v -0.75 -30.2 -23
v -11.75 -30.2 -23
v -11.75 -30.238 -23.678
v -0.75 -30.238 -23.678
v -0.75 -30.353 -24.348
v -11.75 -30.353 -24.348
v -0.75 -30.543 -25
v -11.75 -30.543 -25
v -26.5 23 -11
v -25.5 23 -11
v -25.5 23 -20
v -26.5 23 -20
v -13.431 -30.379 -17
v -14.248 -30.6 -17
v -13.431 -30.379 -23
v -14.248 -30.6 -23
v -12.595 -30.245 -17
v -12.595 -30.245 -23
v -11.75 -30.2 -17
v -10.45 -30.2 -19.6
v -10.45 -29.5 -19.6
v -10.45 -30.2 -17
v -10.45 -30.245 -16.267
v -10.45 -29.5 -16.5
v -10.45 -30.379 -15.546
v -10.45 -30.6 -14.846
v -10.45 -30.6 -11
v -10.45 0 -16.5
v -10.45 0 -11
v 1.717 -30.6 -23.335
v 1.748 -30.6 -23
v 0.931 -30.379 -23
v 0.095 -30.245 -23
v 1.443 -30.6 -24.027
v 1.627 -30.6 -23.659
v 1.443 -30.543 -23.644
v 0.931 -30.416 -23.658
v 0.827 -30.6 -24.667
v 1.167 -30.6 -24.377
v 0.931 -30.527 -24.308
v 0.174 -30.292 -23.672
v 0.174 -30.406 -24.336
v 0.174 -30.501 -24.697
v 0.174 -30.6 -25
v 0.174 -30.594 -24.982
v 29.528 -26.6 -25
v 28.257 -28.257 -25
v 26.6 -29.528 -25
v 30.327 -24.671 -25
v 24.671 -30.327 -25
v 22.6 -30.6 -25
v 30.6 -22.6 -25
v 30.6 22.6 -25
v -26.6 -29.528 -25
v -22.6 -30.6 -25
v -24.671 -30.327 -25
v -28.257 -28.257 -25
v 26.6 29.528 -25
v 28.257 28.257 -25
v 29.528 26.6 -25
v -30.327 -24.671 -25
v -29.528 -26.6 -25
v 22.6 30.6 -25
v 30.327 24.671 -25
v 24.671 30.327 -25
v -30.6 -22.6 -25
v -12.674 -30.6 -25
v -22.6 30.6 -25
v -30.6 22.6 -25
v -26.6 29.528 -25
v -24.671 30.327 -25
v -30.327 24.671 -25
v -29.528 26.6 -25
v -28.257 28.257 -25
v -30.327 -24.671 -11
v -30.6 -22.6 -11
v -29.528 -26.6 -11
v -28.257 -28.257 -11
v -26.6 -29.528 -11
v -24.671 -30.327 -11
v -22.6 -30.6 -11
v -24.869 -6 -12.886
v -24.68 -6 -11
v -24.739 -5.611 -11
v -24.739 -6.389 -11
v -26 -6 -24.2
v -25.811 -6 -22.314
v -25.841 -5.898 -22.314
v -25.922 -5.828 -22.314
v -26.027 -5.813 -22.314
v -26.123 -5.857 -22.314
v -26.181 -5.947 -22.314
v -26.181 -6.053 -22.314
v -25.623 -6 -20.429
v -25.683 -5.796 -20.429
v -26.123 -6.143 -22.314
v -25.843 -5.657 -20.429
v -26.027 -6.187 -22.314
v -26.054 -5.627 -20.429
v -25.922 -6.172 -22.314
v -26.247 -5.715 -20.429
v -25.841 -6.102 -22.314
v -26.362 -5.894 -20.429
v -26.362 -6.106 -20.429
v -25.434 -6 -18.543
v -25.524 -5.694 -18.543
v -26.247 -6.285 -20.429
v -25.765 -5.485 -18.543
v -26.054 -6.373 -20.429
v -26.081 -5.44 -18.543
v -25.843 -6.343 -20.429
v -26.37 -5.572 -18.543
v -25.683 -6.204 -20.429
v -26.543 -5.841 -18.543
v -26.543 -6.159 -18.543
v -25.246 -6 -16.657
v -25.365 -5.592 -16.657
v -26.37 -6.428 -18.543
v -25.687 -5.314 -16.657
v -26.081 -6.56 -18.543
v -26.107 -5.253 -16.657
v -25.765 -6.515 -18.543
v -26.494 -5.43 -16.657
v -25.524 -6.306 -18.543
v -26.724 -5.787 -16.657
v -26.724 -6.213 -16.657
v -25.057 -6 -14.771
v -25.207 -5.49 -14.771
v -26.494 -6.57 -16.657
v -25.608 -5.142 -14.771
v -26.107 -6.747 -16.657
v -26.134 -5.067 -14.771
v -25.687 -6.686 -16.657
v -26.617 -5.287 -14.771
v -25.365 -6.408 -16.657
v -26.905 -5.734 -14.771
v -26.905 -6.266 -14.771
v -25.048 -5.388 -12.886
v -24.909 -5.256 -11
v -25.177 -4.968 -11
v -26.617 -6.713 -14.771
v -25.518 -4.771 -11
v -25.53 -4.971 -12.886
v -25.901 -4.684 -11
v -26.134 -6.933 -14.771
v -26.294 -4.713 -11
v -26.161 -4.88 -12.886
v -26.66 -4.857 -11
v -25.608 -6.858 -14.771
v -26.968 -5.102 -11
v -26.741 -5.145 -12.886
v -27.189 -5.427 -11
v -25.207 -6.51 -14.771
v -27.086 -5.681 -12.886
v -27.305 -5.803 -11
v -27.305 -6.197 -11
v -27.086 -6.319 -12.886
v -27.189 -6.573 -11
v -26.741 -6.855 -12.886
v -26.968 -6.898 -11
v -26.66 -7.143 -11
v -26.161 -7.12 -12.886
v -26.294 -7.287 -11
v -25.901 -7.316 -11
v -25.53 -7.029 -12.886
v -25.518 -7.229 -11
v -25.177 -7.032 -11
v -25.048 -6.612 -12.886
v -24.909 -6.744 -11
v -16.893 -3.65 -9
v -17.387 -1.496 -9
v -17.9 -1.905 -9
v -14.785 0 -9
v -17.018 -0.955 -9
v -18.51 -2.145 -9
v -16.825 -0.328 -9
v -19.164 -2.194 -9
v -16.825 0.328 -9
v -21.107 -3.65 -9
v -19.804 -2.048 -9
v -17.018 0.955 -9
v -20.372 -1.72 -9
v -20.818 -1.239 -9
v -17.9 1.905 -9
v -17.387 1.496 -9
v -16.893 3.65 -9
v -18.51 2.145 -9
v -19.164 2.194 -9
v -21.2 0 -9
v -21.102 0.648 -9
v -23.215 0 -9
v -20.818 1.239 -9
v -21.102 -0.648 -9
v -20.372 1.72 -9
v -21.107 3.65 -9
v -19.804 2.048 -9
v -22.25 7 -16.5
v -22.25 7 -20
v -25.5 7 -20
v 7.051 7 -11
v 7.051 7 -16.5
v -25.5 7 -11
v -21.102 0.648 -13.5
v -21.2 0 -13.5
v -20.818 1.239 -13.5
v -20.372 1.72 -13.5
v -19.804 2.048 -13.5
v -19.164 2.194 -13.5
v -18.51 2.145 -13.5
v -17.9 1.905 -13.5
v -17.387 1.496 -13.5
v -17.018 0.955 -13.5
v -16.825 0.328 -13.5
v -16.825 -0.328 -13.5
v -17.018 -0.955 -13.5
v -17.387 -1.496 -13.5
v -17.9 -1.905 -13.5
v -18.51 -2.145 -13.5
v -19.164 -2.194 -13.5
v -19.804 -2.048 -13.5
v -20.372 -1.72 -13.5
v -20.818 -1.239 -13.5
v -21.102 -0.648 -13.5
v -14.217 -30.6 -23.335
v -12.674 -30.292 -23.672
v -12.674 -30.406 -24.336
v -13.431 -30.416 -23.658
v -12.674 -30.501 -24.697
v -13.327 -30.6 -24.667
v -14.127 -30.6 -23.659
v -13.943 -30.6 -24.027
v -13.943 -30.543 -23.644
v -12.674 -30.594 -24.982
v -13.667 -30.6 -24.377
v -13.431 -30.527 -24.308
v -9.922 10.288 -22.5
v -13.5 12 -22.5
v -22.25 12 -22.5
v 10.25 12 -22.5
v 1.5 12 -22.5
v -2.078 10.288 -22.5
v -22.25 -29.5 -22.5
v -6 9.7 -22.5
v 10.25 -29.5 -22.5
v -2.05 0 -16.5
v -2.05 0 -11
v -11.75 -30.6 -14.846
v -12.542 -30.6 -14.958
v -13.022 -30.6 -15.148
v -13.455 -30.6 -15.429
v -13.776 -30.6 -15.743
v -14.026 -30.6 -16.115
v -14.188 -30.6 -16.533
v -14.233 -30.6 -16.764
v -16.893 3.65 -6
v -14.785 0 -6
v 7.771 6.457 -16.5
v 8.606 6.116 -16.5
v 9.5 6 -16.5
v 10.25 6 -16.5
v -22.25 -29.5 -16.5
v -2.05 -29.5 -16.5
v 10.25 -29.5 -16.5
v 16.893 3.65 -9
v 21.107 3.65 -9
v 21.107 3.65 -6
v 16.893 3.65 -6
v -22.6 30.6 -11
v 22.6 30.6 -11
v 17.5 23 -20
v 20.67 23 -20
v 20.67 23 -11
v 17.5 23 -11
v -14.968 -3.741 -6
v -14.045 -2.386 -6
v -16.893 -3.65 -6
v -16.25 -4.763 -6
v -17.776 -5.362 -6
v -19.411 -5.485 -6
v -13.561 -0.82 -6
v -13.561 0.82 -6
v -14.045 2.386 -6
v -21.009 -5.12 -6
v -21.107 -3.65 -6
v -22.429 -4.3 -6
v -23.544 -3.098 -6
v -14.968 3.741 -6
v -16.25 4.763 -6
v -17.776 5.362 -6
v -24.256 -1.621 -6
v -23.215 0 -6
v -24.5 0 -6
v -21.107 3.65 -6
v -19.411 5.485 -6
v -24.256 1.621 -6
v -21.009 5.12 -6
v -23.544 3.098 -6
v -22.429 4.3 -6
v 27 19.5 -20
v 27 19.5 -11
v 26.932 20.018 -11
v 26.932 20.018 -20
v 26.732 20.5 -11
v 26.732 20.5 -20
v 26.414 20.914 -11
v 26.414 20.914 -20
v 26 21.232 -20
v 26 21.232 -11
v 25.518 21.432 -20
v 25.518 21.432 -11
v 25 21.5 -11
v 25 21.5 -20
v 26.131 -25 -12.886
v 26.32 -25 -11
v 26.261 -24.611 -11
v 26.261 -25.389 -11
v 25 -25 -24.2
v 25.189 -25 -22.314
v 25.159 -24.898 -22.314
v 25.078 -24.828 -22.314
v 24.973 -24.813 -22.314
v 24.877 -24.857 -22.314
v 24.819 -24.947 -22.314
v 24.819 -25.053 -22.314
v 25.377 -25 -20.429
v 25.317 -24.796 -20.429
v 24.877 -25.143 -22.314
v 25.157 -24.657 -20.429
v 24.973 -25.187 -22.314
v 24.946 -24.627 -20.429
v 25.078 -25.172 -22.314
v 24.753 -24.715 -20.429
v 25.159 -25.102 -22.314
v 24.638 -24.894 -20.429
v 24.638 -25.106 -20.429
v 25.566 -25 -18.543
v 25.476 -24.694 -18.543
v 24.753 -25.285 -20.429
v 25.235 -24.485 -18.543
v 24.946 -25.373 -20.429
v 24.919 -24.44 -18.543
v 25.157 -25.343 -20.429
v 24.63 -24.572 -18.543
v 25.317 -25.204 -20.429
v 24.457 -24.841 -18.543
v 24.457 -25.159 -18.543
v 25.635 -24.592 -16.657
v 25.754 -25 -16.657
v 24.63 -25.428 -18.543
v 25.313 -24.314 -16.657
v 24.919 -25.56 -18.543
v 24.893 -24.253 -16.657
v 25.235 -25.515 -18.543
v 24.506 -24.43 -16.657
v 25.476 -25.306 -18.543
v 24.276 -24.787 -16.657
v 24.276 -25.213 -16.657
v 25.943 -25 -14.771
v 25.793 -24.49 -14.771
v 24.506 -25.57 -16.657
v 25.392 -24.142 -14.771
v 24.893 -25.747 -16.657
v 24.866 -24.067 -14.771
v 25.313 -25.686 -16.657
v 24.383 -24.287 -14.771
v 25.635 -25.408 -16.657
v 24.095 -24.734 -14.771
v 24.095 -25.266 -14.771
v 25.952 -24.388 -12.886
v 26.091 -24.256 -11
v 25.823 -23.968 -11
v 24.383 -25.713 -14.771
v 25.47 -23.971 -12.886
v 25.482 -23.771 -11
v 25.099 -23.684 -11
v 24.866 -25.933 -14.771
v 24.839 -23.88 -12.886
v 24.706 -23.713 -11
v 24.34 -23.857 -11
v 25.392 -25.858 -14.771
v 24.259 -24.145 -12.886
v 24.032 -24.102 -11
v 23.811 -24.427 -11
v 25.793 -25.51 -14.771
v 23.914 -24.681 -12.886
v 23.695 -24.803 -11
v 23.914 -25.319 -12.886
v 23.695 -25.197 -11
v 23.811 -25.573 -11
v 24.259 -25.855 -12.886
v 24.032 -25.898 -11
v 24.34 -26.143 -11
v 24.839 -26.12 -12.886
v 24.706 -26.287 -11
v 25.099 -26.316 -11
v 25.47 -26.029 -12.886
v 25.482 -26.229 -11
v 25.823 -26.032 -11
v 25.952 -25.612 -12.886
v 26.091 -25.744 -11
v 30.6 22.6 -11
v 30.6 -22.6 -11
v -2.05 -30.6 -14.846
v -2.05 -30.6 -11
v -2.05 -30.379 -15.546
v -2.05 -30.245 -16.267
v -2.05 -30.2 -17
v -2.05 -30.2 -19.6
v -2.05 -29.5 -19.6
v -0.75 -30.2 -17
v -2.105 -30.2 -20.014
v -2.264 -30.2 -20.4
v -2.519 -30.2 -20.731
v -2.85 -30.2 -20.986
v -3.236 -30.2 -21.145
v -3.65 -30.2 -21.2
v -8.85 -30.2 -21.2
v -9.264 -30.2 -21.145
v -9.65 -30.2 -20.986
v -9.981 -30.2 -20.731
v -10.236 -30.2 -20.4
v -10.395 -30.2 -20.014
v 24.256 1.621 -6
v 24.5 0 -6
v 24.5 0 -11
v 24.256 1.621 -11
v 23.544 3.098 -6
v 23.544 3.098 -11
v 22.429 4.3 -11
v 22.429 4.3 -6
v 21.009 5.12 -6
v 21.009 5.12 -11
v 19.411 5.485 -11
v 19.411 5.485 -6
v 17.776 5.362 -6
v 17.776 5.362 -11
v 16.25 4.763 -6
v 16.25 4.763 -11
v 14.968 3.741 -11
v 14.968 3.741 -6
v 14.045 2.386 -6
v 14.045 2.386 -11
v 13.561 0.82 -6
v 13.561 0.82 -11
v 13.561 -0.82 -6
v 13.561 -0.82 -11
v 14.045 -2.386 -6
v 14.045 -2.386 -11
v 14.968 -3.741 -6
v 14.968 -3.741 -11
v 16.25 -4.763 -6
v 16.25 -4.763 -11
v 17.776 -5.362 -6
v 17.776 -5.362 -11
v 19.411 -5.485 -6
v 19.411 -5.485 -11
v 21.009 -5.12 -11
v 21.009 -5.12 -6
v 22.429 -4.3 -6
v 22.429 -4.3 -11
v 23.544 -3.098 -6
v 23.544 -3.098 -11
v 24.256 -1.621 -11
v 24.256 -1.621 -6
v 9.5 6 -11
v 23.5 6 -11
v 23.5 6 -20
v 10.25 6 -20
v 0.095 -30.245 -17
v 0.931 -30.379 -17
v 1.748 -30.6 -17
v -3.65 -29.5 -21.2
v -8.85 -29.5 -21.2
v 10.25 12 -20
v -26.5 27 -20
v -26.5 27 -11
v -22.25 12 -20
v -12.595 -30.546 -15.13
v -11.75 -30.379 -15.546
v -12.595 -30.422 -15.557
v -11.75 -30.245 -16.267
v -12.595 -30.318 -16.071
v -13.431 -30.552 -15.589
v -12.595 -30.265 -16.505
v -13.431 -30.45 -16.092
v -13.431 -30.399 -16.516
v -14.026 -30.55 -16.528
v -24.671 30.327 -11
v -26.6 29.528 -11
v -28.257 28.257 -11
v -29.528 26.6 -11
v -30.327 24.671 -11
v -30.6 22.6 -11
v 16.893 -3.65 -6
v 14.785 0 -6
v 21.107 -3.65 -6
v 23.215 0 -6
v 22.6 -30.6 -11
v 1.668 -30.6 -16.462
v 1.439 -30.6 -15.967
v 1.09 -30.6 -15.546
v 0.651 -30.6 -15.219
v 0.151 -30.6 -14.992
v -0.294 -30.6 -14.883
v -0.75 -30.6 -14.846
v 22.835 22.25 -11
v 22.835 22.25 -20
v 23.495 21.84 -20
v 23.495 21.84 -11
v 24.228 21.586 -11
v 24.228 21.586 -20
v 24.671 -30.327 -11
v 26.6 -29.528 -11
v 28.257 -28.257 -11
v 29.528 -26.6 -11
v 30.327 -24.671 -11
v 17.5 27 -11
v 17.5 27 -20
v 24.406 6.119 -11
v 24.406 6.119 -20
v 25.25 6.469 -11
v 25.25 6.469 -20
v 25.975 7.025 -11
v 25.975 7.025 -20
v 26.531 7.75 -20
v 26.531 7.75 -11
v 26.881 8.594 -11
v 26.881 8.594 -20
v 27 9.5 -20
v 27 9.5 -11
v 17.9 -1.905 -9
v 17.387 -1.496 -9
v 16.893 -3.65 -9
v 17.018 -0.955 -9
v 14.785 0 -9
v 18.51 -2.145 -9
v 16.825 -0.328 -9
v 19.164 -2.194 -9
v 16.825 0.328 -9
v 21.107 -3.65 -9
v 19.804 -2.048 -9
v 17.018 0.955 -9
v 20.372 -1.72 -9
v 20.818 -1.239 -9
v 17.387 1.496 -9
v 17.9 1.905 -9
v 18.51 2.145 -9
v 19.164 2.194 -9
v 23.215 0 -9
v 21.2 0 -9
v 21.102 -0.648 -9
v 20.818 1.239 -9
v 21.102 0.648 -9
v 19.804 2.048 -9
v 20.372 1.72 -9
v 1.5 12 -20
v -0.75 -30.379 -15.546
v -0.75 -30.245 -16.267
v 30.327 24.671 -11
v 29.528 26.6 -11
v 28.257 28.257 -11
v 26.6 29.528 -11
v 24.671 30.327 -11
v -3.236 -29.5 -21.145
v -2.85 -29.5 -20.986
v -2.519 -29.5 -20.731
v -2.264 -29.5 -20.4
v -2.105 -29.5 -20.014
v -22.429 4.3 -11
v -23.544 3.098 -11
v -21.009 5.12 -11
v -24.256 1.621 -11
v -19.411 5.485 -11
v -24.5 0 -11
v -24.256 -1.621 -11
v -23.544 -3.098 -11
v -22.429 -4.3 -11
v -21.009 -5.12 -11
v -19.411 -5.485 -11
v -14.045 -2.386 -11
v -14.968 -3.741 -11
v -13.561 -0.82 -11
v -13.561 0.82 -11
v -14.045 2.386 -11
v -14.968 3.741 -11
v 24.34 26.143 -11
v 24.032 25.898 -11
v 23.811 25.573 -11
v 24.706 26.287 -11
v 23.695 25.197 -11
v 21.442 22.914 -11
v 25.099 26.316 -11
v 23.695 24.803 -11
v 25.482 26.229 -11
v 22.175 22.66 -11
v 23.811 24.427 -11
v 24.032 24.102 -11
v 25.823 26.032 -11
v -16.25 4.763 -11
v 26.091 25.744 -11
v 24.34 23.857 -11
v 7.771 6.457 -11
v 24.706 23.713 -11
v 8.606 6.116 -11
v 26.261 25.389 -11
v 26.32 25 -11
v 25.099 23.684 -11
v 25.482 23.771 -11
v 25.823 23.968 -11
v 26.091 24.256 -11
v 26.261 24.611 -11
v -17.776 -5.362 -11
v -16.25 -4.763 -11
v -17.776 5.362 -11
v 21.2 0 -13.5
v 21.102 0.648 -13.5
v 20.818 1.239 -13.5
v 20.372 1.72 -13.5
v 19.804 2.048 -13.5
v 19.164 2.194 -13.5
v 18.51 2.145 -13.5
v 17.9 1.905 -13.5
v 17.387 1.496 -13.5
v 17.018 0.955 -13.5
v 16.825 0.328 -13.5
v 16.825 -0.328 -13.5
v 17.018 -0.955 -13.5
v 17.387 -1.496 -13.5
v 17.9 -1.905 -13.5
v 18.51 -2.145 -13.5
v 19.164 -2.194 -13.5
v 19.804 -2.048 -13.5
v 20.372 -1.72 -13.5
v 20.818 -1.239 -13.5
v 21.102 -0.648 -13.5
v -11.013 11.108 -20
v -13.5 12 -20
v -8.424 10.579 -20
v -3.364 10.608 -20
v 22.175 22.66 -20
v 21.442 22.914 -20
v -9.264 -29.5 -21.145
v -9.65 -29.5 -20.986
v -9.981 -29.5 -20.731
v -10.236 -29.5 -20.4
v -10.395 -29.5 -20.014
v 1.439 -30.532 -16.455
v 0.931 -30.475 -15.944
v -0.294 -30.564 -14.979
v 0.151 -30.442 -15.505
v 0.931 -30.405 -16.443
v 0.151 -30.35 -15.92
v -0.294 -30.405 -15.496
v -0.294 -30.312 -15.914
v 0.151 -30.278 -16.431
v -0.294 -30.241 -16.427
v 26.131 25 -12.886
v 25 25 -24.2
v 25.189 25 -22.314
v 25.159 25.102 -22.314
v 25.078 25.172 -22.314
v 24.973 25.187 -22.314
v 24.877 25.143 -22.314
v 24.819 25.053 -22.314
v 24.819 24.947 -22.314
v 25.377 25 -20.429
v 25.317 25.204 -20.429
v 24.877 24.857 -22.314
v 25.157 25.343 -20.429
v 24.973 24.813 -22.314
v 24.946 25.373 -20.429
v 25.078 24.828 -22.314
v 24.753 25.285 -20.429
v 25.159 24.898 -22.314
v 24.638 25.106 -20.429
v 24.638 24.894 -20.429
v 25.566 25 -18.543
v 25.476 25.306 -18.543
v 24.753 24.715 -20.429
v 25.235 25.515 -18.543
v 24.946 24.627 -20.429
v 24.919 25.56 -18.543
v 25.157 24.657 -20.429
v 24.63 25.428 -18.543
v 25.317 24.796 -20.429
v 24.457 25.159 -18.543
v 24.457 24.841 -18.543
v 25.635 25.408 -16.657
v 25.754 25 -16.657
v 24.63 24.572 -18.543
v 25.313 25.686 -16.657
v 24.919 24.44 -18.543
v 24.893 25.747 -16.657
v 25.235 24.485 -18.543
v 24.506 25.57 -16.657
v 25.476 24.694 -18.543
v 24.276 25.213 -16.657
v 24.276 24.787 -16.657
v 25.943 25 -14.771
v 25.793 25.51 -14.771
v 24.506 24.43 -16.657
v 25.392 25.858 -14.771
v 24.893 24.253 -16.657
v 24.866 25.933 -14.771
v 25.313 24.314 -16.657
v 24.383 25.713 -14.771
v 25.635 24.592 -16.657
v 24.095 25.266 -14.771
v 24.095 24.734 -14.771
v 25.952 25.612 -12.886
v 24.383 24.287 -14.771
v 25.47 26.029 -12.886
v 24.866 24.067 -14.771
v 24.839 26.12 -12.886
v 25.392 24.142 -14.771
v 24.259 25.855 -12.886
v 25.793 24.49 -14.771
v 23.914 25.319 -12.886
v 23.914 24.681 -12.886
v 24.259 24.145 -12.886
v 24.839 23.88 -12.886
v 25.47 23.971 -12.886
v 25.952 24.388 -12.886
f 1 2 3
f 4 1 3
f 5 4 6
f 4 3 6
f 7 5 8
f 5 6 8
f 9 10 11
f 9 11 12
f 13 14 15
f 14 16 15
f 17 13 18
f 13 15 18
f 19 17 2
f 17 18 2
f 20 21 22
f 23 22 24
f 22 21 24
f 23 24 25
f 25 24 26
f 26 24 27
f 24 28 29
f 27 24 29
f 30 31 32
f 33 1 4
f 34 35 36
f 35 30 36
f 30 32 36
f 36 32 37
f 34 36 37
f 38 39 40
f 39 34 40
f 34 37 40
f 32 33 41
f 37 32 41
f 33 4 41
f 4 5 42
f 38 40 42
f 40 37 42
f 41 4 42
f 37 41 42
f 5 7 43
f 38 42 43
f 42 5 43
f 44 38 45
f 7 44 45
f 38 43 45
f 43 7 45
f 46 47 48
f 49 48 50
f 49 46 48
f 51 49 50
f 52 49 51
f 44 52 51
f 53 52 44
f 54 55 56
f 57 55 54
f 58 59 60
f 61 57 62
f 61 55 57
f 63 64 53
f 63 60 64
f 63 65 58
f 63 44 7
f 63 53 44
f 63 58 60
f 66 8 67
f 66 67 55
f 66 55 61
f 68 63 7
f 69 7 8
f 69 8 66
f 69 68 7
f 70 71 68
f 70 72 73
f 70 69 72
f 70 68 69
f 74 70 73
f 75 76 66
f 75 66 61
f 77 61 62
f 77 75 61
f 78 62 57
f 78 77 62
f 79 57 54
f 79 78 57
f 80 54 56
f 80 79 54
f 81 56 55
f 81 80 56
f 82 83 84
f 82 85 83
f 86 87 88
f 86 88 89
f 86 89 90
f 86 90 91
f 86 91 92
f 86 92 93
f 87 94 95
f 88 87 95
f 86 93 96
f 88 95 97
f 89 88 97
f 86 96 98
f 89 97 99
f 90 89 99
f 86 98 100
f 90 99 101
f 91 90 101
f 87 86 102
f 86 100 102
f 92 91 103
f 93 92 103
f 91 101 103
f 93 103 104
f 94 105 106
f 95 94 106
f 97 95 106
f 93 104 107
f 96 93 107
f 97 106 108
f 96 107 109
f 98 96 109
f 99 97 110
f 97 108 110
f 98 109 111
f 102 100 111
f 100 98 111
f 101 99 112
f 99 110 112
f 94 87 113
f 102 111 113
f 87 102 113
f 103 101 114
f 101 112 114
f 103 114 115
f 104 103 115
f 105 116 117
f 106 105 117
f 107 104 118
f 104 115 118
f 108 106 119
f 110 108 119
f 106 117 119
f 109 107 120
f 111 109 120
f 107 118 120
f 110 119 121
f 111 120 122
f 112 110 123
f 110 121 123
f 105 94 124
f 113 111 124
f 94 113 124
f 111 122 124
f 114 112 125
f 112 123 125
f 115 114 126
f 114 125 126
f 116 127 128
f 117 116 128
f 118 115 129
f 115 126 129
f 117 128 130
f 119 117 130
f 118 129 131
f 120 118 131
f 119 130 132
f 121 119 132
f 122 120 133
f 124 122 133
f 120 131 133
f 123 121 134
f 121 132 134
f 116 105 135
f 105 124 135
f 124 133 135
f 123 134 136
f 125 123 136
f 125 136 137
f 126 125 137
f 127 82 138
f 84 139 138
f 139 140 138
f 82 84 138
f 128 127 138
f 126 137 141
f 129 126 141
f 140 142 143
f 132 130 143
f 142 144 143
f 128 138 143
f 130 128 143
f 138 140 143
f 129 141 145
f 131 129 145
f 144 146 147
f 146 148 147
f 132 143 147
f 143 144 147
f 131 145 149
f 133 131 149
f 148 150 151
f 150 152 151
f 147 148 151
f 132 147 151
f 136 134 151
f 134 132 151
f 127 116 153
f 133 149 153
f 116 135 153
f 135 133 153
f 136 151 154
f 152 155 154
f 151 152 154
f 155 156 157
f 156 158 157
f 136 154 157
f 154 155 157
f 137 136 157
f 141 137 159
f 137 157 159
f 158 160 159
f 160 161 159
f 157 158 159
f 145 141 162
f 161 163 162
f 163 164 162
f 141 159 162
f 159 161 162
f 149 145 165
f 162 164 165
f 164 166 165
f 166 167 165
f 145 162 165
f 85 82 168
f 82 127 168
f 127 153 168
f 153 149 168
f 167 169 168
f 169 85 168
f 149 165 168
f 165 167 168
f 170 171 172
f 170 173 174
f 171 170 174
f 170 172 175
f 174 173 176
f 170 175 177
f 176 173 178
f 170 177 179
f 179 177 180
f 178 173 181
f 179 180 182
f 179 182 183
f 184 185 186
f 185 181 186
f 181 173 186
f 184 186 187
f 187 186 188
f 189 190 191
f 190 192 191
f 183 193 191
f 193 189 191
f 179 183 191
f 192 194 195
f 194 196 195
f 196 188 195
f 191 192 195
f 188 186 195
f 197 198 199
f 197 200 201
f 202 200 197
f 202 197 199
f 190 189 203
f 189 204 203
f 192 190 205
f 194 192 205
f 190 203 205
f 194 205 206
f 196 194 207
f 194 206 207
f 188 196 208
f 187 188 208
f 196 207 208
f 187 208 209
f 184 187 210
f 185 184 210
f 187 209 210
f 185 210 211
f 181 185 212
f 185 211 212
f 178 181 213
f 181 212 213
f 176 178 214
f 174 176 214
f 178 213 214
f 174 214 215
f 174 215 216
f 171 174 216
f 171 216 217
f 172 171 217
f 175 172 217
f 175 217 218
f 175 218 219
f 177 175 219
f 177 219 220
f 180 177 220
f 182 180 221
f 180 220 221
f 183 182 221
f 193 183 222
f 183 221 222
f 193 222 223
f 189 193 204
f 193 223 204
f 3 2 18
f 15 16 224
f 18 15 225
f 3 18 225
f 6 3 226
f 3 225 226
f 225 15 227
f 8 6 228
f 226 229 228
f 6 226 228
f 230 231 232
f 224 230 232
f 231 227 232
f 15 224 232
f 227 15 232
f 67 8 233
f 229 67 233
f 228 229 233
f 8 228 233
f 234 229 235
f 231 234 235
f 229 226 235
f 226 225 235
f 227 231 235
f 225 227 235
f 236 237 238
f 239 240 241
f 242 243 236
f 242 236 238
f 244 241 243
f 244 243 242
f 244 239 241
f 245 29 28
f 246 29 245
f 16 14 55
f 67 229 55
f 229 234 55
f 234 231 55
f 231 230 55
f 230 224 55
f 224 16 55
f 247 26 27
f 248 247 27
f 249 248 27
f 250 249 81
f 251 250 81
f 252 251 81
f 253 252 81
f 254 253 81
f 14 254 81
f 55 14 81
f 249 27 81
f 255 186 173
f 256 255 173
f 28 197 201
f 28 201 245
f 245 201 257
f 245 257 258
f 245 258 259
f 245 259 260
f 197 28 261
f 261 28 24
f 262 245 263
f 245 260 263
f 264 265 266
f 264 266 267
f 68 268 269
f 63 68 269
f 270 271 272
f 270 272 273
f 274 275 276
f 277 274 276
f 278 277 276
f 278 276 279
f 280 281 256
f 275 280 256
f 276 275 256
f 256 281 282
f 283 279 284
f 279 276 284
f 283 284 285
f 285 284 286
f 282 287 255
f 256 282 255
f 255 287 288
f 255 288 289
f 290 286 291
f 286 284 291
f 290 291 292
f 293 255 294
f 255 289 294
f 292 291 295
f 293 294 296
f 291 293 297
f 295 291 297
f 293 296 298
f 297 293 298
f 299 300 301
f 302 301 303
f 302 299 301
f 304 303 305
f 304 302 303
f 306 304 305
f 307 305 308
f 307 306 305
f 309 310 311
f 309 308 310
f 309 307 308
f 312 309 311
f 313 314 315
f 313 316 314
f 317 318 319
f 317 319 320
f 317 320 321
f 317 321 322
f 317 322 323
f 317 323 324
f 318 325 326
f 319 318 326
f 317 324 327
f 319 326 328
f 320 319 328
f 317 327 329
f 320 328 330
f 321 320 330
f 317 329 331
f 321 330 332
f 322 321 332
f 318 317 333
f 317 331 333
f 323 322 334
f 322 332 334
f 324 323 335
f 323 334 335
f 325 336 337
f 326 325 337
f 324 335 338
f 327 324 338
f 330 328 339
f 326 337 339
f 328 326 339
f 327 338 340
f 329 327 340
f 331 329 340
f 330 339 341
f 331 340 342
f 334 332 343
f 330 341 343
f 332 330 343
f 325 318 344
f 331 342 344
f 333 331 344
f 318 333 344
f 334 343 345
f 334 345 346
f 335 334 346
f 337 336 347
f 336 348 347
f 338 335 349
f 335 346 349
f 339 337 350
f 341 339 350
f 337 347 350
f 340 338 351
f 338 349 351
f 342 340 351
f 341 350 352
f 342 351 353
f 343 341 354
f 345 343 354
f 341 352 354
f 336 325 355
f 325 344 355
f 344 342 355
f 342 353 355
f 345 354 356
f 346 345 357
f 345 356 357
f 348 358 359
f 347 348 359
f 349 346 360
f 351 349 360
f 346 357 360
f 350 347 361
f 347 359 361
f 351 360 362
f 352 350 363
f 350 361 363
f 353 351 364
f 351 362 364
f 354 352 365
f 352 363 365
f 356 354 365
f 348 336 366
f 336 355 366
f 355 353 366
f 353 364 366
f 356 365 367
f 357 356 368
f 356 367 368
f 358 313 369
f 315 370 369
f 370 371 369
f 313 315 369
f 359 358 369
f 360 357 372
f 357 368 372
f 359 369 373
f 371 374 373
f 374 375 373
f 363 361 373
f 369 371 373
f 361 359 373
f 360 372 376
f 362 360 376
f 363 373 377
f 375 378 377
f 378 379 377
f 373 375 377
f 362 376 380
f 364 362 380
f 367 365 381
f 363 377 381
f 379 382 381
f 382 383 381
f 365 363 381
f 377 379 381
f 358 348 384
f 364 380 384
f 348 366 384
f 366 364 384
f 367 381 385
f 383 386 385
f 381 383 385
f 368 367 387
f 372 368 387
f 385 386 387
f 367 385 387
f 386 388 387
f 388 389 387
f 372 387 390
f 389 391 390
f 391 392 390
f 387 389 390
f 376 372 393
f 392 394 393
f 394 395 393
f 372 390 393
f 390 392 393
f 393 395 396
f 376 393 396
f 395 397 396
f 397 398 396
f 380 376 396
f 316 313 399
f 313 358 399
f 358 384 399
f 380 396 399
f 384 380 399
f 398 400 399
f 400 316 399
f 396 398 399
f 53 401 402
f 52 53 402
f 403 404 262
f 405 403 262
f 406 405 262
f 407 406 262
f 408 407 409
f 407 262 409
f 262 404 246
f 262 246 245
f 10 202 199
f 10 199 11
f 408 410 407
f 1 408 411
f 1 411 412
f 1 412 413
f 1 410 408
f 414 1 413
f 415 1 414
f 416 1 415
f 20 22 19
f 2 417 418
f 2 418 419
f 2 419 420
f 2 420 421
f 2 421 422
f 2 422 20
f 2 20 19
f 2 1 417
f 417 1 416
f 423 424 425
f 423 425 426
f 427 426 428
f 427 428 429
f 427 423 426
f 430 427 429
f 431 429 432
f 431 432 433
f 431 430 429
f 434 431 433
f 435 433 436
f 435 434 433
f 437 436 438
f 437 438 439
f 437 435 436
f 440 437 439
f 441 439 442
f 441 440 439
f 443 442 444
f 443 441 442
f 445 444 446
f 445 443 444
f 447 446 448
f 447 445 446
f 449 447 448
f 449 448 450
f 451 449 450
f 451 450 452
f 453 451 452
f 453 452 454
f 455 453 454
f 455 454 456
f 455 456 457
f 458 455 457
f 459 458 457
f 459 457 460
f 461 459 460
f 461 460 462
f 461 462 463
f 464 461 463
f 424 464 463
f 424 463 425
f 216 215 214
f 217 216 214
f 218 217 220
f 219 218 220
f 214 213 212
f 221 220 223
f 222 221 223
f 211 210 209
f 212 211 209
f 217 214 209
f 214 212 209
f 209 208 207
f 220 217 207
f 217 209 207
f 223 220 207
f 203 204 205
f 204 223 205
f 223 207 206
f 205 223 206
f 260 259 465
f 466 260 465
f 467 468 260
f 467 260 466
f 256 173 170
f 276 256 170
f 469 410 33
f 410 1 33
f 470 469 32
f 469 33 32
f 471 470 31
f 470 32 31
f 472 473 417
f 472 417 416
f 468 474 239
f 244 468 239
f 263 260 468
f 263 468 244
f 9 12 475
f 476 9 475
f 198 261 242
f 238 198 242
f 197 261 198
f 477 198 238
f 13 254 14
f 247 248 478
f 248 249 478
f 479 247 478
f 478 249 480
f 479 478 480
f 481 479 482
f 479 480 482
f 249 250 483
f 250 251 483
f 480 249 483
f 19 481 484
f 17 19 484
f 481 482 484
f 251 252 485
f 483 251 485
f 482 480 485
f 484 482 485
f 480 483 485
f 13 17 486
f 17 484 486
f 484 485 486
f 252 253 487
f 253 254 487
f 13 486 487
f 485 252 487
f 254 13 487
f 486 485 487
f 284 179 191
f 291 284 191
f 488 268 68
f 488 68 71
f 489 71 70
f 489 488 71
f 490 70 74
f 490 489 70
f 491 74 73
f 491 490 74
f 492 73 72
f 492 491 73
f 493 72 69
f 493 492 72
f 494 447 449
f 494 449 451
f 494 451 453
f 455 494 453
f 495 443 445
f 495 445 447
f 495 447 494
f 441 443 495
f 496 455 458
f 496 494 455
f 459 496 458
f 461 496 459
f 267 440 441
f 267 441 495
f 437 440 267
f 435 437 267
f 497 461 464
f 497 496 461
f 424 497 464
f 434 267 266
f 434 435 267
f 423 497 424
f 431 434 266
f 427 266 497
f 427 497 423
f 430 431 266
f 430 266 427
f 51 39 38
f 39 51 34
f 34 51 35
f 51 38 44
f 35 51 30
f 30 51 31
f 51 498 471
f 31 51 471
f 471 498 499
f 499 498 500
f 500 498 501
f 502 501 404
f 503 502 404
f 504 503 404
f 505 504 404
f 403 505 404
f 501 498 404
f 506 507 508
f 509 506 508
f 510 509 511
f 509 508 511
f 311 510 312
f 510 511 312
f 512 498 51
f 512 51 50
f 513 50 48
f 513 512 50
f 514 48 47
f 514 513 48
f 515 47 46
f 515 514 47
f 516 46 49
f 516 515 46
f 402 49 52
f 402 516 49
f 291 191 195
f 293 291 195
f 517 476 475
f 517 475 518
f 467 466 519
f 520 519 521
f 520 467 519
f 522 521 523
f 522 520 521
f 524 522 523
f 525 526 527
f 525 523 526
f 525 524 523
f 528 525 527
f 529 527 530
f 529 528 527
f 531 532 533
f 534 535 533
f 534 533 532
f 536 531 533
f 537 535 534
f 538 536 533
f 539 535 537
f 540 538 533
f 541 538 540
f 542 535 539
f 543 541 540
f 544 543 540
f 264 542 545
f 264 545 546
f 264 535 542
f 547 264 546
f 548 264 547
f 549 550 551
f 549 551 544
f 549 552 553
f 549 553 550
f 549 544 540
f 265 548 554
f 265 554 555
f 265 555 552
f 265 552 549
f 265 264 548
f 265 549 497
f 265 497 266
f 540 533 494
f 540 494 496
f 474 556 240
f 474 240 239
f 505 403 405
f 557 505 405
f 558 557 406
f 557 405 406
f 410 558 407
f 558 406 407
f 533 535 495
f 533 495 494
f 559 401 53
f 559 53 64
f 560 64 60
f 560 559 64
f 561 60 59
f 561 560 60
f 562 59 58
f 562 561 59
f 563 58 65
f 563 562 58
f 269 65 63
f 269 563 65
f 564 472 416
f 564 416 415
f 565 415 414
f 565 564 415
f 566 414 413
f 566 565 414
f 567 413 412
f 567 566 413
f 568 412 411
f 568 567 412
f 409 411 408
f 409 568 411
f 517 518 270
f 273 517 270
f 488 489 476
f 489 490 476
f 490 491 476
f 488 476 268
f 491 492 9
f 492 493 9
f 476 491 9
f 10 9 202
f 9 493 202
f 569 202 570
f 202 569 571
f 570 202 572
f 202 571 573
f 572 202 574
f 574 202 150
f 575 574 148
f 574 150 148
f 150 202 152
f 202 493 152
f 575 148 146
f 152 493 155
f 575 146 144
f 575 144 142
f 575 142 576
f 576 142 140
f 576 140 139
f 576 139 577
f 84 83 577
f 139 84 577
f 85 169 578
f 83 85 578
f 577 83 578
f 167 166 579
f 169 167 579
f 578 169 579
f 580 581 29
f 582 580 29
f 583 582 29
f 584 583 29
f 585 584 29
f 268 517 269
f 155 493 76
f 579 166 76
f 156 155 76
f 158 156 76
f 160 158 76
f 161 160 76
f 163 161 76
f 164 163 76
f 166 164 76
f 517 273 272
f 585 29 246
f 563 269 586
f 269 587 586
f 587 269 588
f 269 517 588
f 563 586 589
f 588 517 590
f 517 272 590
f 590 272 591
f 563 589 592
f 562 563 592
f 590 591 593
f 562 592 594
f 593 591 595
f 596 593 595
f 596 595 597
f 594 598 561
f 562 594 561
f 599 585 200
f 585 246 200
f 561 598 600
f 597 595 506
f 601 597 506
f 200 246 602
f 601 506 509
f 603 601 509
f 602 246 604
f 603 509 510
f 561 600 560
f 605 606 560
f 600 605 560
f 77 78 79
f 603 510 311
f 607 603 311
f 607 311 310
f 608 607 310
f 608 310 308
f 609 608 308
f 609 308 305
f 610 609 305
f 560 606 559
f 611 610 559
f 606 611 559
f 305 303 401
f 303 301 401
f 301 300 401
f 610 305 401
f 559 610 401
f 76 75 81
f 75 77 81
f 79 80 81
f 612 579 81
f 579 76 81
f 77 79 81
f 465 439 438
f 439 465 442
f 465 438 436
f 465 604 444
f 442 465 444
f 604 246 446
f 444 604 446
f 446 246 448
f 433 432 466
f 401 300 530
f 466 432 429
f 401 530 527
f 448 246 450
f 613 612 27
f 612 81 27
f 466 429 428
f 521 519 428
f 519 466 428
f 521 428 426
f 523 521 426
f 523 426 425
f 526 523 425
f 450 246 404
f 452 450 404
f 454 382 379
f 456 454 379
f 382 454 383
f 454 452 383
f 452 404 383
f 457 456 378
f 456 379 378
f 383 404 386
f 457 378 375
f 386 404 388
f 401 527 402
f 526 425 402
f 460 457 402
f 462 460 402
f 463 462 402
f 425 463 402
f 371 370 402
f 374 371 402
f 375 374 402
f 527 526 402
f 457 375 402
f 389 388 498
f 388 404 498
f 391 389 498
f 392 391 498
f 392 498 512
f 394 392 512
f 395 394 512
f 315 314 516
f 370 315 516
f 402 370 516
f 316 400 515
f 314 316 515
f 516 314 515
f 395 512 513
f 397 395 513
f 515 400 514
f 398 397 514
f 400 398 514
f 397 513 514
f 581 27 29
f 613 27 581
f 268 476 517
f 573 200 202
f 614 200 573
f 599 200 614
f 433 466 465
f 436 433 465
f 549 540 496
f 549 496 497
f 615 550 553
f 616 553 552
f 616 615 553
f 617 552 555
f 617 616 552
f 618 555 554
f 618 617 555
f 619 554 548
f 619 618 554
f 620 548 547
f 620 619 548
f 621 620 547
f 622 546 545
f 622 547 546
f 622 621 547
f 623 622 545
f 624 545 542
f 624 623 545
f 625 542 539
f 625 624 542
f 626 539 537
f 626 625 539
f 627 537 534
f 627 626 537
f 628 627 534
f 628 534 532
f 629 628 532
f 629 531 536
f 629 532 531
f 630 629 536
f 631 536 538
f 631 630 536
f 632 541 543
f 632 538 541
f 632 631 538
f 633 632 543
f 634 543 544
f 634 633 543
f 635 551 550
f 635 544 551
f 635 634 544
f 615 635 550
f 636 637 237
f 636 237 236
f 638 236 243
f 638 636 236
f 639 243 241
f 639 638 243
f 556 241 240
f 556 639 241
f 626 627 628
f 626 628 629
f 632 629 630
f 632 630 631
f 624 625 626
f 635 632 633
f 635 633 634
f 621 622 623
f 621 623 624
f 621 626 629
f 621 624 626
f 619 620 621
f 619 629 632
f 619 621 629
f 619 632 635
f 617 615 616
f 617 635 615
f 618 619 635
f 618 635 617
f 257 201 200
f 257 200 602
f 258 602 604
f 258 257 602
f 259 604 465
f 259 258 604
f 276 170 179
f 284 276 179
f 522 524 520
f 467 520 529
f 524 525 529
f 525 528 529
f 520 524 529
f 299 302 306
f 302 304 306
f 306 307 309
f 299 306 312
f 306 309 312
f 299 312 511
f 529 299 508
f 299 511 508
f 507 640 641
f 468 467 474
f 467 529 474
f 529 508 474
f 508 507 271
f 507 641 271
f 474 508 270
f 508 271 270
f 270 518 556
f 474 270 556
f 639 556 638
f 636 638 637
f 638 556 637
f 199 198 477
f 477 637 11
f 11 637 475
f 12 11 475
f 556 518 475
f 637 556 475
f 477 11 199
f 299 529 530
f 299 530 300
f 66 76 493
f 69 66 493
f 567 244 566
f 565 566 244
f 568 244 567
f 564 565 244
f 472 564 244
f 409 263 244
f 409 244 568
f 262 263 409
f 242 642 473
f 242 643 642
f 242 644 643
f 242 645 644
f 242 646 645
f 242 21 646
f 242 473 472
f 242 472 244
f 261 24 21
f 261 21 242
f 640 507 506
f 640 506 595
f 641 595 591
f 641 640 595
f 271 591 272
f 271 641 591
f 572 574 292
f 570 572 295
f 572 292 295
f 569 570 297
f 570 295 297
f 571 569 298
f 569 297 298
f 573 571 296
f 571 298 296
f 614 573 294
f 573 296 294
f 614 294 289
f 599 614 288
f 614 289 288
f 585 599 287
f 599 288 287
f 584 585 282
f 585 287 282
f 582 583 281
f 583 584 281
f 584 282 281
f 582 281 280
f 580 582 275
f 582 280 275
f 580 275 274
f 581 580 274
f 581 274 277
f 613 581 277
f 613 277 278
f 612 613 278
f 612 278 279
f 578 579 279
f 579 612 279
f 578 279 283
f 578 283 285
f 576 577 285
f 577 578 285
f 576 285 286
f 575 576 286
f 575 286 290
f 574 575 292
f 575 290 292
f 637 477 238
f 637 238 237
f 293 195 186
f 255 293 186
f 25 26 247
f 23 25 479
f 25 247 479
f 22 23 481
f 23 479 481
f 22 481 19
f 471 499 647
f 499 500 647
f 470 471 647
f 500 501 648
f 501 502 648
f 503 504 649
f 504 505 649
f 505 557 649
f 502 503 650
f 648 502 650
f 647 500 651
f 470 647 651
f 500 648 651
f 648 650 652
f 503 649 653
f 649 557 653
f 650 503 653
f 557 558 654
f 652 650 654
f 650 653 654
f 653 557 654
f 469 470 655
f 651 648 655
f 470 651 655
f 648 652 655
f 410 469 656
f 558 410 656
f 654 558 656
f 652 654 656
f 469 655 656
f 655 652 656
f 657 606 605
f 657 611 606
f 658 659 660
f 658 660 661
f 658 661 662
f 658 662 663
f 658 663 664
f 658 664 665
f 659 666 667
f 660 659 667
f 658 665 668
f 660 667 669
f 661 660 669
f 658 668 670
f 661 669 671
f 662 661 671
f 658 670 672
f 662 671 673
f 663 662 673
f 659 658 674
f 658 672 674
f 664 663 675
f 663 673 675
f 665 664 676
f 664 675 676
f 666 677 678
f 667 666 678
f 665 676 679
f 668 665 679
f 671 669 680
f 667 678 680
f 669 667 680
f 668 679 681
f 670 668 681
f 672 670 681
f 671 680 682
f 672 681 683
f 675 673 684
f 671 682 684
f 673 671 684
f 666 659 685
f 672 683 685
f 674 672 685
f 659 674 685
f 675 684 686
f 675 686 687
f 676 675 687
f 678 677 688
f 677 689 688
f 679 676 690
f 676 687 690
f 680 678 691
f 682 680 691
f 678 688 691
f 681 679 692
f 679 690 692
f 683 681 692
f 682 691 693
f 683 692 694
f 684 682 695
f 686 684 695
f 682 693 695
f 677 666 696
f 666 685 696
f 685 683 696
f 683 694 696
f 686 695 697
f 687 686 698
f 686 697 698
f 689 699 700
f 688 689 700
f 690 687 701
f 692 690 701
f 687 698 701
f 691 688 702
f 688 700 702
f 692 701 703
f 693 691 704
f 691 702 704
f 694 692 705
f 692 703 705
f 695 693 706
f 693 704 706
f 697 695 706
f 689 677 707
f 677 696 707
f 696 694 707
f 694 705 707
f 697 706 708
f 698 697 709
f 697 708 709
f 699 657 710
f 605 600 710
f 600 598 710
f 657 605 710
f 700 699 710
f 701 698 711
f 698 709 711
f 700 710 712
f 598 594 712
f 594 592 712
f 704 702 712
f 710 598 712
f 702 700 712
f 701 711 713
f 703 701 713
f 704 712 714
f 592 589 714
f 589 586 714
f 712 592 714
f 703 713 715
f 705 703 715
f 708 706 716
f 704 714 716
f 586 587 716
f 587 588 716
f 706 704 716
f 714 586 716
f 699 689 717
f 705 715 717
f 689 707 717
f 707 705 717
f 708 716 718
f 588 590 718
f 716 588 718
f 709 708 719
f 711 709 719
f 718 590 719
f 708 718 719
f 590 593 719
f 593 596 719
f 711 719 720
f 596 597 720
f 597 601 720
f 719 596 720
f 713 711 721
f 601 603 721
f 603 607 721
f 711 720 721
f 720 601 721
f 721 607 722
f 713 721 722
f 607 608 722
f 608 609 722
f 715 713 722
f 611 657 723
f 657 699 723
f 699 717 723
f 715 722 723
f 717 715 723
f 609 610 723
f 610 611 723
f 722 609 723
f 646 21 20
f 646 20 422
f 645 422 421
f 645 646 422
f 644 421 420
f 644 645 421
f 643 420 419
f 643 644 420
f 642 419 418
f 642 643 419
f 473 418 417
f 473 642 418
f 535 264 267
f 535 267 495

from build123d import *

# Parameters (mm, degrees)
PAD017_DEPTH         = 27.5
POCKET043_DEPTH      = 30.601
POCKET044_DEPTH      = 22.501
SKETCH115_W          = 70
SKETCH115_H          = 14
POCKET041_DEPTH      = 30.601
POCKET041_DEPTH_BACK = 30.601
POCKET048_DEPTH      = 9
SKETCH132_R          = 5.5
PAD019_DEPTH         = 5.5
POCKET049_DEPTH      = 180.22267


with BuildPart() as part:
    # Sketch116 → Pad017 (new body)
    with BuildSketch(Plane.XY.offset(2.5)):
        with BuildLine():
            Line((-22.6, 30.6), (22.6, 30.6))
            ThreePointArc((30.6, 22.6), (28.256854, 28.256854), (22.6, 30.6))
            Line((30.6, 22.6), (30.6, -22.6))
            ThreePointArc((22.6, -30.6), (28.256854, -28.256854), (30.6, -22.6))
            Line((22.6, -30.6), (-22.6, -30.6))
            ThreePointArc((-30.6, -22.6), (-28.256854, -28.256854), (-22.6, -30.6))
            Line((-30.6, -22.6), (-30.6, 22.6))
            ThreePointArc((-22.6, 30.6), (-28.256854, 28.256854), (-30.6, 22.6))
        make_face()
    extrude(amount=-PAD017_DEPTH)

    # Sketch117 → Groove014 (revolve, cut)
    with BuildSketch(Plane.XZ.offset(6)):
        Polygon((-26, 3), (-26, -24.2), (-24.4, -8.2), (-23, -6.8), (-23, 3), align=None)
    revolve(axis=Axis((-26, -6, 3), (0, 0, 1)), mode=Mode.SUBTRACT)

    # Sketch118 → Groove013 (revolve, cut)
    with BuildSketch(Plane.XZ.offset(25)):
        Polygon((25, 3), (25, -24.2), (26.6, -8.2), (28, -6.8), (28, 3), align=None)
    revolve(axis=Axis((25, -25, 3), (0, 0, 1)), mode=Mode.SUBTRACT)

    # Sketch119 → Groove016 (revolve, cut)
    with BuildSketch(Plane.XZ.offset(-25)):
        Polygon((25, 3), (25, -24.2), (26.6, -8.2), (28, -6.8), (28, 3), align=None)
    revolve(axis=Axis((25, 25, 3), (0, 0, 1)), mode=Mode.SUBTRACT)

    # Sketch127 → SubtractiveLoft003 section 0
    with BuildSketch(Plane.XY.offset(-22.5)):
        with BuildLine():
            Line((-22.25, 12), (-13.5, 12))
            ThreePointArc((-13.5, 12), (-6, 9.7), (1.5, 12))
            Line((1.5, 12), (10.25, 12))
            Line((10.25, 12), (10.25, -29.5))
            Line((10.25, -29.5), (-22.25, -29.5))
            Line((-22.25, -29.5), (-22.25, 12))
        make_face()
    # Sketch124 → SubtractiveLoft003 section 1
    with BuildSketch(Plane.XY.offset(-16.5)):
        with BuildLine():
            Line((-22.25, 12), (-13.5, 12))
            ThreePointArc((-13.5, 12), (-6, 11.431818), (1.5, 12))
            Line((1.5, 12), (10.25, 12))
            Line((10.25, 12), (10.25, -29.5))
            Line((10.25, -29.5), (-22.25, -29.5))
            Line((-22.25, -29.5), (-22.25, 12))
        make_face()
    loft(mode=Mode.SUBTRACT)

    # Sketch125 → Pocket043 (cut, through all)
    with BuildSketch(Plane.XZ):
        with BuildLine():
            ThreePointArc((-10.45, -19.6), (-9.981371, -20.731371), (-8.85, -21.2))
            Line((-8.85, -21.2), (-3.65, -21.2))
            ThreePointArc((-3.65, -21.2), (-2.518629, -20.731371), (-2.05, -19.6))
            Line((-2.05, 0), (-2.05, -19.6))
            Line((-10.45, 0), (-2.05, 0))
            Line((-10.45, -19.6), (-10.45, 0))
        make_face()
    extrude(amount=POCKET043_DEPTH, mode=Mode.SUBTRACT)

    # SubtractivePipe008: sweep along a path in Sketch126
    with BuildLine(Plane.YZ) as subtractivepipe008_path:
        ThreePointArc((-32.2, -12.527864), (-30.722774, -14.55051), (-30.2, -17))
        Line((-30.2, -17), (-30.2, -23))
        ThreePointArc((-30.2, -23), (-30.722774, -25.44949), (-32.2, -27.472136))
    # Sketch128 → SubtractivePipe008 (sweep, cut)
    with BuildSketch(Plane.XY.offset(-20)):
        with BuildLine():
            ThreePointArc((-11.75, -30.2), (-14.578427, -30.716685), (-17.041503, -32.2))
            Line((-17.041503, -32.2), (4.541503, -32.2))
            ThreePointArc((4.541503, -32.2), (2.078427, -30.716685), (-0.75, -30.2))
            Line((-11.75, -30.2), (-0.75, -30.2))
        make_face()
    sweep(path=subtractivepipe008_path.line, mode=Mode.SUBTRACT)

    # Sketch129 → Pocket044 (cut, through all)
    with BuildSketch(Plane.XY.offset(-20)):
        with BuildLine():
            ThreePointArc((22.834936, 22.25), (23.854356, 21.692811), (25, 21.5))
            ThreePointArc((27, 19.5), (26.414214, 20.914214), (25, 21.5))
            Line((27, 9.5), (27, 19.5))
            ThreePointArc((23.5, 6), (25.974874, 7.025126), (27, 9.5))
            Line((9.5, 6), (23.5, 6))
            ThreePointArc((6, 9.5), (7.025126, 7.025126), (9.5, 6))
            Line((6, 19.5), (6, 9.5))
            ThreePointArc((9.5, 23), (7.025126, 21.974874), (6, 19.5))
            Line((20.669873, 23), (9.5, 23))
            ThreePointArc((22.834936, 22.25), (21.815517, 22.807189), (20.669873, 23))
        make_face()
    extrude(amount=POCKET044_DEPTH, mode=Mode.SUBTRACT)

    # Sketch115 → Pocket041 (cut, two sides)
    with BuildSketch(Plane.XZ) as pocket041_sk:
        with Locations((0, -4)):
            Rectangle(SKETCH115_W, SKETCH115_H)
    extrude(amount=-POCKET041_DEPTH, mode=Mode.SUBTRACT)
    extrude(pocket041_sk.sketch, amount=POCKET041_DEPTH_BACK, mode=Mode.SUBTRACT)

    # Sketch122 → Pocket048 (cut, symmetric)
    with BuildSketch(Plane.XY.offset(-11)):
        Polygon((-26.5, 27), (17.5, 27), (17.5, 23), (15.5, 23), (15.5, 7), (-25.5, 7), (-25.5, 23), (-26.5, 23), align=None)
    extrude(amount=POCKET048_DEPTH, both=True, mode=Mode.SUBTRACT)

    # Sketch132 → Pad019 (join)
    with BuildSketch(Plane.XY.offset(-6)):
        with Locations((19, 0)):
            Circle(SKETCH132_R)
    pad019 = extrude(amount=-PAD019_DEPTH)

    # Sketch121 → Groove017 (revolve, cut)
    with BuildSketch(Plane.XZ):
        Polygon((19, -1.5), (21.8, -1.5), (21.2, -3.148486), (21.2, -13.5), (19, -13.5), align=None)
    groove017 = revolve(axis=Axis((19, 0, -1.5), (0, 0, 1)), mode=Mode.SUBTRACT)

    # Sketch133 → Pocket049 (cut, through all)
    with BuildSketch(Plane.XY.offset(-9)):
        Polygon((23.214657, 0), (21.107328, 3.65), (16.892672, 3.65), (14.785343, 0), (16.892672, -3.65), (21.107328, -3.65), align=None)
    pocket049 = extrude(amount=POCKET049_DEPTH, mode=Mode.SUBTRACT)

    # Mirrored010: Pad019, Groove017, Pocket049 across YZ
    add(pad019.mirror(Plane.YZ))
    add(groove017.mirror(Plane.YZ), mode=Mode.SUBTRACT)
    add(pocket049.mirror(Plane.YZ), mode=Mode.SUBTRACT)


solid = part.part
